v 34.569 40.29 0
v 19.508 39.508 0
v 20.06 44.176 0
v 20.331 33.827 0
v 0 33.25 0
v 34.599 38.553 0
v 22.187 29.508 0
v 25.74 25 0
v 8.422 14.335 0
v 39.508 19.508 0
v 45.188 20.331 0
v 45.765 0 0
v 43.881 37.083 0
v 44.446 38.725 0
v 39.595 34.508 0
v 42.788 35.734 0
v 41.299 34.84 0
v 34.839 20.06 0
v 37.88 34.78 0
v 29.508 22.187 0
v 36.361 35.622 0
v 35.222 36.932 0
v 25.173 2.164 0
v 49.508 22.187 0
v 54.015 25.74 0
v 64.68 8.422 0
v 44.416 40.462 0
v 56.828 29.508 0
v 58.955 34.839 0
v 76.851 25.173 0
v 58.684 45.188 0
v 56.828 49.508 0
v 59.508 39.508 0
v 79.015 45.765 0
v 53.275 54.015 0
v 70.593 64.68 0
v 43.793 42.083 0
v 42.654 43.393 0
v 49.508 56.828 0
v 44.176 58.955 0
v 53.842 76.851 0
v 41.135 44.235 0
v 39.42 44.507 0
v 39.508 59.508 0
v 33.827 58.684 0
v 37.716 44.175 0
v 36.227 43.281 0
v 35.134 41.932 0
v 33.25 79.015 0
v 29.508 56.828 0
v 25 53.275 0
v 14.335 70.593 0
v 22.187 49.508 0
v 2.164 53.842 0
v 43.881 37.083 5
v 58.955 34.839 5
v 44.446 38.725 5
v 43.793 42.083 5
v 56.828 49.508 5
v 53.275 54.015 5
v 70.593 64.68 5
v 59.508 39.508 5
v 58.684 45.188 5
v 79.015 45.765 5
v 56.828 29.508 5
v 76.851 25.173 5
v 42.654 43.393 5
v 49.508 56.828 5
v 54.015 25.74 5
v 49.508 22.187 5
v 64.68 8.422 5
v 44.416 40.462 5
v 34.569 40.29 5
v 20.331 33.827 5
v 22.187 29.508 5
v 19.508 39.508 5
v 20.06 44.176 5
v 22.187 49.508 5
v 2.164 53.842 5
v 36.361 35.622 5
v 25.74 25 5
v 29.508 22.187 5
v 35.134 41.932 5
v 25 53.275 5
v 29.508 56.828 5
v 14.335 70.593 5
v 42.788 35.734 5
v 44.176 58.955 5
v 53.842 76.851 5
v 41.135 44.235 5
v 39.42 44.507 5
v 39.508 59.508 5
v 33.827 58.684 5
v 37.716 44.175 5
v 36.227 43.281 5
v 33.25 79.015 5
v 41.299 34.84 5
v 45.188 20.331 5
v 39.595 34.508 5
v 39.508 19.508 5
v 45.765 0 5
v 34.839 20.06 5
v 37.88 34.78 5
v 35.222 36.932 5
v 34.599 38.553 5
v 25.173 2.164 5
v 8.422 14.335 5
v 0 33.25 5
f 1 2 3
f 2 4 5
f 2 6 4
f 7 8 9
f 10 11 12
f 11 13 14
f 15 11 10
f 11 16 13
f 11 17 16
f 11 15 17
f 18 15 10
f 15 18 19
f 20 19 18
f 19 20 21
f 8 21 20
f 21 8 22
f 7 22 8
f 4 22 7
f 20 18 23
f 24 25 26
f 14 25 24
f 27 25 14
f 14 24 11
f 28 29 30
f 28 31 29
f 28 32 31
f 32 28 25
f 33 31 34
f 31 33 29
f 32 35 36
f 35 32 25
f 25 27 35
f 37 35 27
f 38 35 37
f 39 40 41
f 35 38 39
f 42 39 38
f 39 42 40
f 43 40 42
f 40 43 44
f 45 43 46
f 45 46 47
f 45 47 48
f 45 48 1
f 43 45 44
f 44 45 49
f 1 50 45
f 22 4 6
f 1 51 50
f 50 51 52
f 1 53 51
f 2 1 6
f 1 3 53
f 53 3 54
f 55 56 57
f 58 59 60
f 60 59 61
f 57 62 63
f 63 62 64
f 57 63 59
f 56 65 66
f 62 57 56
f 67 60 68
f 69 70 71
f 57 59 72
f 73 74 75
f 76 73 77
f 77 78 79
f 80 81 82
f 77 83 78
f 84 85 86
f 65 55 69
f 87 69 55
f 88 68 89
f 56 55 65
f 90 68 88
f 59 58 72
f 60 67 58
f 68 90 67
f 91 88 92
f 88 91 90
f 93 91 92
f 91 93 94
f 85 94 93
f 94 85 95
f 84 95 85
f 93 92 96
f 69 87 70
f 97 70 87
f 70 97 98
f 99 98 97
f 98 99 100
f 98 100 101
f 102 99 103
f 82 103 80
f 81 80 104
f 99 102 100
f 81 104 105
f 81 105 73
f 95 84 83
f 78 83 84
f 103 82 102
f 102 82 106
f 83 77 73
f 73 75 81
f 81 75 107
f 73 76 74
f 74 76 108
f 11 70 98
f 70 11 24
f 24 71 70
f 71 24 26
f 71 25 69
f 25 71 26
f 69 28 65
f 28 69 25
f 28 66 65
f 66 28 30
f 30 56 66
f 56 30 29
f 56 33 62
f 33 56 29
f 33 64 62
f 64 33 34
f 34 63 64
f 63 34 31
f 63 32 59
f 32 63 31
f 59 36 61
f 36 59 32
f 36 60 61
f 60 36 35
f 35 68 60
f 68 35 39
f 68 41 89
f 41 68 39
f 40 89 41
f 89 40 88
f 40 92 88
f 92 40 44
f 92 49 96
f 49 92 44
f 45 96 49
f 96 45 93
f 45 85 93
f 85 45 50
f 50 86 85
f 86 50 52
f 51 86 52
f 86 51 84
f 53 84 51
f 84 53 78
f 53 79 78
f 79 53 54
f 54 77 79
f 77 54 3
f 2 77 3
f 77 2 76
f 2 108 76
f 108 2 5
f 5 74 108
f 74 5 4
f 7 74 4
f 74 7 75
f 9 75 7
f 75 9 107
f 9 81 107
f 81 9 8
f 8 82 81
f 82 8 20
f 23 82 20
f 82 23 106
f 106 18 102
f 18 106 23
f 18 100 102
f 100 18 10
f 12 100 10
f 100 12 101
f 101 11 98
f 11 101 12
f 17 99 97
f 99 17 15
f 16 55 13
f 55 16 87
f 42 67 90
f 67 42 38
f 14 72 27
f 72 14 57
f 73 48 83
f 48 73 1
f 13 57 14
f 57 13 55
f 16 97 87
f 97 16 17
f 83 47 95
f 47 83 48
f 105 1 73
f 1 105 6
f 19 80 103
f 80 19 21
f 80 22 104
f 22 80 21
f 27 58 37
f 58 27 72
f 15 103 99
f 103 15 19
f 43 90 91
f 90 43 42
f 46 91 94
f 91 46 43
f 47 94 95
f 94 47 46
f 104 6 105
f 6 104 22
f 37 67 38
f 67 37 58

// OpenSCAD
$fn = 32;

// ----------------------------------------------------------------------
// Star wheel: 12-point ratchet, R40
// ----------------------------------------------------------------------

// --- parameters (mm) ---
n_points = 12;            // number of points / teeth
r_out = 40;               // tip radius
r_in = 20;                // root radius
bore_r = 5;               // centre bore radius
plate_t = 5;              // plate thickness, Z (extrusion height)
bore_d = 10;              // centre bore diameter
fit_tol = 0.1;            // declared fit tolerance (prompt contract)
free_tol = 0.3;           // declared free tolerance (prompt contract)

profile = [[39.508, 59.508], [33.25, 79.015], [33.827, 58.684], [29.508, 56.828], [14.335, 70.593], [25, 53.275], [22.187, 49.508], [2.164, 53.842], [20.06, 44.176], [19.508, 39.508], [0, 33.25], [20.331, 33.827], [22.187, 29.508], [8.422, 14.335], [25.74, 25], [29.508, 22.187], [25.173, 2.164], [34.839, 20.06], [39.508, 19.508], [45.765, 0], [45.188, 20.331], [49.508, 22.187], [64.68, 8.422], [54.015, 25.74], [56.828, 29.508], [76.851, 25.173], [58.955, 34.839], [59.508, 39.508], [79.015, 45.765], [58.684, 45.188], [56.828, 49.508], [70.593, 64.68], [53.275, 54.015], [49.508, 56.828], [53.842, 76.851], [44.176, 58.955]];  // primary outline, 36 points, counter clockwise
void_1 = [[44.416, 40.462], [43.793, 42.083], [42.654, 43.393], [41.135, 44.235], [39.42, 44.507], [37.716, 44.175], [36.227, 43.281], [35.134, 41.932], [34.569, 40.29], [34.599, 38.553], [35.222, 36.932], [36.361, 35.622], [37.88, 34.78], [39.595, 34.508], [41.299, 34.84], [42.788, 35.734], [43.881, 37.083], [44.446, 38.725]];  // centre bore, 18 points

// --- the one profile operation ---
difference() {
  linear_extrude(height = plate_t) polygon(points = profile);
  translate([0, 0, -1])
    linear_extrude(height = plate_t + 2) polygon(points = void_1);
}
